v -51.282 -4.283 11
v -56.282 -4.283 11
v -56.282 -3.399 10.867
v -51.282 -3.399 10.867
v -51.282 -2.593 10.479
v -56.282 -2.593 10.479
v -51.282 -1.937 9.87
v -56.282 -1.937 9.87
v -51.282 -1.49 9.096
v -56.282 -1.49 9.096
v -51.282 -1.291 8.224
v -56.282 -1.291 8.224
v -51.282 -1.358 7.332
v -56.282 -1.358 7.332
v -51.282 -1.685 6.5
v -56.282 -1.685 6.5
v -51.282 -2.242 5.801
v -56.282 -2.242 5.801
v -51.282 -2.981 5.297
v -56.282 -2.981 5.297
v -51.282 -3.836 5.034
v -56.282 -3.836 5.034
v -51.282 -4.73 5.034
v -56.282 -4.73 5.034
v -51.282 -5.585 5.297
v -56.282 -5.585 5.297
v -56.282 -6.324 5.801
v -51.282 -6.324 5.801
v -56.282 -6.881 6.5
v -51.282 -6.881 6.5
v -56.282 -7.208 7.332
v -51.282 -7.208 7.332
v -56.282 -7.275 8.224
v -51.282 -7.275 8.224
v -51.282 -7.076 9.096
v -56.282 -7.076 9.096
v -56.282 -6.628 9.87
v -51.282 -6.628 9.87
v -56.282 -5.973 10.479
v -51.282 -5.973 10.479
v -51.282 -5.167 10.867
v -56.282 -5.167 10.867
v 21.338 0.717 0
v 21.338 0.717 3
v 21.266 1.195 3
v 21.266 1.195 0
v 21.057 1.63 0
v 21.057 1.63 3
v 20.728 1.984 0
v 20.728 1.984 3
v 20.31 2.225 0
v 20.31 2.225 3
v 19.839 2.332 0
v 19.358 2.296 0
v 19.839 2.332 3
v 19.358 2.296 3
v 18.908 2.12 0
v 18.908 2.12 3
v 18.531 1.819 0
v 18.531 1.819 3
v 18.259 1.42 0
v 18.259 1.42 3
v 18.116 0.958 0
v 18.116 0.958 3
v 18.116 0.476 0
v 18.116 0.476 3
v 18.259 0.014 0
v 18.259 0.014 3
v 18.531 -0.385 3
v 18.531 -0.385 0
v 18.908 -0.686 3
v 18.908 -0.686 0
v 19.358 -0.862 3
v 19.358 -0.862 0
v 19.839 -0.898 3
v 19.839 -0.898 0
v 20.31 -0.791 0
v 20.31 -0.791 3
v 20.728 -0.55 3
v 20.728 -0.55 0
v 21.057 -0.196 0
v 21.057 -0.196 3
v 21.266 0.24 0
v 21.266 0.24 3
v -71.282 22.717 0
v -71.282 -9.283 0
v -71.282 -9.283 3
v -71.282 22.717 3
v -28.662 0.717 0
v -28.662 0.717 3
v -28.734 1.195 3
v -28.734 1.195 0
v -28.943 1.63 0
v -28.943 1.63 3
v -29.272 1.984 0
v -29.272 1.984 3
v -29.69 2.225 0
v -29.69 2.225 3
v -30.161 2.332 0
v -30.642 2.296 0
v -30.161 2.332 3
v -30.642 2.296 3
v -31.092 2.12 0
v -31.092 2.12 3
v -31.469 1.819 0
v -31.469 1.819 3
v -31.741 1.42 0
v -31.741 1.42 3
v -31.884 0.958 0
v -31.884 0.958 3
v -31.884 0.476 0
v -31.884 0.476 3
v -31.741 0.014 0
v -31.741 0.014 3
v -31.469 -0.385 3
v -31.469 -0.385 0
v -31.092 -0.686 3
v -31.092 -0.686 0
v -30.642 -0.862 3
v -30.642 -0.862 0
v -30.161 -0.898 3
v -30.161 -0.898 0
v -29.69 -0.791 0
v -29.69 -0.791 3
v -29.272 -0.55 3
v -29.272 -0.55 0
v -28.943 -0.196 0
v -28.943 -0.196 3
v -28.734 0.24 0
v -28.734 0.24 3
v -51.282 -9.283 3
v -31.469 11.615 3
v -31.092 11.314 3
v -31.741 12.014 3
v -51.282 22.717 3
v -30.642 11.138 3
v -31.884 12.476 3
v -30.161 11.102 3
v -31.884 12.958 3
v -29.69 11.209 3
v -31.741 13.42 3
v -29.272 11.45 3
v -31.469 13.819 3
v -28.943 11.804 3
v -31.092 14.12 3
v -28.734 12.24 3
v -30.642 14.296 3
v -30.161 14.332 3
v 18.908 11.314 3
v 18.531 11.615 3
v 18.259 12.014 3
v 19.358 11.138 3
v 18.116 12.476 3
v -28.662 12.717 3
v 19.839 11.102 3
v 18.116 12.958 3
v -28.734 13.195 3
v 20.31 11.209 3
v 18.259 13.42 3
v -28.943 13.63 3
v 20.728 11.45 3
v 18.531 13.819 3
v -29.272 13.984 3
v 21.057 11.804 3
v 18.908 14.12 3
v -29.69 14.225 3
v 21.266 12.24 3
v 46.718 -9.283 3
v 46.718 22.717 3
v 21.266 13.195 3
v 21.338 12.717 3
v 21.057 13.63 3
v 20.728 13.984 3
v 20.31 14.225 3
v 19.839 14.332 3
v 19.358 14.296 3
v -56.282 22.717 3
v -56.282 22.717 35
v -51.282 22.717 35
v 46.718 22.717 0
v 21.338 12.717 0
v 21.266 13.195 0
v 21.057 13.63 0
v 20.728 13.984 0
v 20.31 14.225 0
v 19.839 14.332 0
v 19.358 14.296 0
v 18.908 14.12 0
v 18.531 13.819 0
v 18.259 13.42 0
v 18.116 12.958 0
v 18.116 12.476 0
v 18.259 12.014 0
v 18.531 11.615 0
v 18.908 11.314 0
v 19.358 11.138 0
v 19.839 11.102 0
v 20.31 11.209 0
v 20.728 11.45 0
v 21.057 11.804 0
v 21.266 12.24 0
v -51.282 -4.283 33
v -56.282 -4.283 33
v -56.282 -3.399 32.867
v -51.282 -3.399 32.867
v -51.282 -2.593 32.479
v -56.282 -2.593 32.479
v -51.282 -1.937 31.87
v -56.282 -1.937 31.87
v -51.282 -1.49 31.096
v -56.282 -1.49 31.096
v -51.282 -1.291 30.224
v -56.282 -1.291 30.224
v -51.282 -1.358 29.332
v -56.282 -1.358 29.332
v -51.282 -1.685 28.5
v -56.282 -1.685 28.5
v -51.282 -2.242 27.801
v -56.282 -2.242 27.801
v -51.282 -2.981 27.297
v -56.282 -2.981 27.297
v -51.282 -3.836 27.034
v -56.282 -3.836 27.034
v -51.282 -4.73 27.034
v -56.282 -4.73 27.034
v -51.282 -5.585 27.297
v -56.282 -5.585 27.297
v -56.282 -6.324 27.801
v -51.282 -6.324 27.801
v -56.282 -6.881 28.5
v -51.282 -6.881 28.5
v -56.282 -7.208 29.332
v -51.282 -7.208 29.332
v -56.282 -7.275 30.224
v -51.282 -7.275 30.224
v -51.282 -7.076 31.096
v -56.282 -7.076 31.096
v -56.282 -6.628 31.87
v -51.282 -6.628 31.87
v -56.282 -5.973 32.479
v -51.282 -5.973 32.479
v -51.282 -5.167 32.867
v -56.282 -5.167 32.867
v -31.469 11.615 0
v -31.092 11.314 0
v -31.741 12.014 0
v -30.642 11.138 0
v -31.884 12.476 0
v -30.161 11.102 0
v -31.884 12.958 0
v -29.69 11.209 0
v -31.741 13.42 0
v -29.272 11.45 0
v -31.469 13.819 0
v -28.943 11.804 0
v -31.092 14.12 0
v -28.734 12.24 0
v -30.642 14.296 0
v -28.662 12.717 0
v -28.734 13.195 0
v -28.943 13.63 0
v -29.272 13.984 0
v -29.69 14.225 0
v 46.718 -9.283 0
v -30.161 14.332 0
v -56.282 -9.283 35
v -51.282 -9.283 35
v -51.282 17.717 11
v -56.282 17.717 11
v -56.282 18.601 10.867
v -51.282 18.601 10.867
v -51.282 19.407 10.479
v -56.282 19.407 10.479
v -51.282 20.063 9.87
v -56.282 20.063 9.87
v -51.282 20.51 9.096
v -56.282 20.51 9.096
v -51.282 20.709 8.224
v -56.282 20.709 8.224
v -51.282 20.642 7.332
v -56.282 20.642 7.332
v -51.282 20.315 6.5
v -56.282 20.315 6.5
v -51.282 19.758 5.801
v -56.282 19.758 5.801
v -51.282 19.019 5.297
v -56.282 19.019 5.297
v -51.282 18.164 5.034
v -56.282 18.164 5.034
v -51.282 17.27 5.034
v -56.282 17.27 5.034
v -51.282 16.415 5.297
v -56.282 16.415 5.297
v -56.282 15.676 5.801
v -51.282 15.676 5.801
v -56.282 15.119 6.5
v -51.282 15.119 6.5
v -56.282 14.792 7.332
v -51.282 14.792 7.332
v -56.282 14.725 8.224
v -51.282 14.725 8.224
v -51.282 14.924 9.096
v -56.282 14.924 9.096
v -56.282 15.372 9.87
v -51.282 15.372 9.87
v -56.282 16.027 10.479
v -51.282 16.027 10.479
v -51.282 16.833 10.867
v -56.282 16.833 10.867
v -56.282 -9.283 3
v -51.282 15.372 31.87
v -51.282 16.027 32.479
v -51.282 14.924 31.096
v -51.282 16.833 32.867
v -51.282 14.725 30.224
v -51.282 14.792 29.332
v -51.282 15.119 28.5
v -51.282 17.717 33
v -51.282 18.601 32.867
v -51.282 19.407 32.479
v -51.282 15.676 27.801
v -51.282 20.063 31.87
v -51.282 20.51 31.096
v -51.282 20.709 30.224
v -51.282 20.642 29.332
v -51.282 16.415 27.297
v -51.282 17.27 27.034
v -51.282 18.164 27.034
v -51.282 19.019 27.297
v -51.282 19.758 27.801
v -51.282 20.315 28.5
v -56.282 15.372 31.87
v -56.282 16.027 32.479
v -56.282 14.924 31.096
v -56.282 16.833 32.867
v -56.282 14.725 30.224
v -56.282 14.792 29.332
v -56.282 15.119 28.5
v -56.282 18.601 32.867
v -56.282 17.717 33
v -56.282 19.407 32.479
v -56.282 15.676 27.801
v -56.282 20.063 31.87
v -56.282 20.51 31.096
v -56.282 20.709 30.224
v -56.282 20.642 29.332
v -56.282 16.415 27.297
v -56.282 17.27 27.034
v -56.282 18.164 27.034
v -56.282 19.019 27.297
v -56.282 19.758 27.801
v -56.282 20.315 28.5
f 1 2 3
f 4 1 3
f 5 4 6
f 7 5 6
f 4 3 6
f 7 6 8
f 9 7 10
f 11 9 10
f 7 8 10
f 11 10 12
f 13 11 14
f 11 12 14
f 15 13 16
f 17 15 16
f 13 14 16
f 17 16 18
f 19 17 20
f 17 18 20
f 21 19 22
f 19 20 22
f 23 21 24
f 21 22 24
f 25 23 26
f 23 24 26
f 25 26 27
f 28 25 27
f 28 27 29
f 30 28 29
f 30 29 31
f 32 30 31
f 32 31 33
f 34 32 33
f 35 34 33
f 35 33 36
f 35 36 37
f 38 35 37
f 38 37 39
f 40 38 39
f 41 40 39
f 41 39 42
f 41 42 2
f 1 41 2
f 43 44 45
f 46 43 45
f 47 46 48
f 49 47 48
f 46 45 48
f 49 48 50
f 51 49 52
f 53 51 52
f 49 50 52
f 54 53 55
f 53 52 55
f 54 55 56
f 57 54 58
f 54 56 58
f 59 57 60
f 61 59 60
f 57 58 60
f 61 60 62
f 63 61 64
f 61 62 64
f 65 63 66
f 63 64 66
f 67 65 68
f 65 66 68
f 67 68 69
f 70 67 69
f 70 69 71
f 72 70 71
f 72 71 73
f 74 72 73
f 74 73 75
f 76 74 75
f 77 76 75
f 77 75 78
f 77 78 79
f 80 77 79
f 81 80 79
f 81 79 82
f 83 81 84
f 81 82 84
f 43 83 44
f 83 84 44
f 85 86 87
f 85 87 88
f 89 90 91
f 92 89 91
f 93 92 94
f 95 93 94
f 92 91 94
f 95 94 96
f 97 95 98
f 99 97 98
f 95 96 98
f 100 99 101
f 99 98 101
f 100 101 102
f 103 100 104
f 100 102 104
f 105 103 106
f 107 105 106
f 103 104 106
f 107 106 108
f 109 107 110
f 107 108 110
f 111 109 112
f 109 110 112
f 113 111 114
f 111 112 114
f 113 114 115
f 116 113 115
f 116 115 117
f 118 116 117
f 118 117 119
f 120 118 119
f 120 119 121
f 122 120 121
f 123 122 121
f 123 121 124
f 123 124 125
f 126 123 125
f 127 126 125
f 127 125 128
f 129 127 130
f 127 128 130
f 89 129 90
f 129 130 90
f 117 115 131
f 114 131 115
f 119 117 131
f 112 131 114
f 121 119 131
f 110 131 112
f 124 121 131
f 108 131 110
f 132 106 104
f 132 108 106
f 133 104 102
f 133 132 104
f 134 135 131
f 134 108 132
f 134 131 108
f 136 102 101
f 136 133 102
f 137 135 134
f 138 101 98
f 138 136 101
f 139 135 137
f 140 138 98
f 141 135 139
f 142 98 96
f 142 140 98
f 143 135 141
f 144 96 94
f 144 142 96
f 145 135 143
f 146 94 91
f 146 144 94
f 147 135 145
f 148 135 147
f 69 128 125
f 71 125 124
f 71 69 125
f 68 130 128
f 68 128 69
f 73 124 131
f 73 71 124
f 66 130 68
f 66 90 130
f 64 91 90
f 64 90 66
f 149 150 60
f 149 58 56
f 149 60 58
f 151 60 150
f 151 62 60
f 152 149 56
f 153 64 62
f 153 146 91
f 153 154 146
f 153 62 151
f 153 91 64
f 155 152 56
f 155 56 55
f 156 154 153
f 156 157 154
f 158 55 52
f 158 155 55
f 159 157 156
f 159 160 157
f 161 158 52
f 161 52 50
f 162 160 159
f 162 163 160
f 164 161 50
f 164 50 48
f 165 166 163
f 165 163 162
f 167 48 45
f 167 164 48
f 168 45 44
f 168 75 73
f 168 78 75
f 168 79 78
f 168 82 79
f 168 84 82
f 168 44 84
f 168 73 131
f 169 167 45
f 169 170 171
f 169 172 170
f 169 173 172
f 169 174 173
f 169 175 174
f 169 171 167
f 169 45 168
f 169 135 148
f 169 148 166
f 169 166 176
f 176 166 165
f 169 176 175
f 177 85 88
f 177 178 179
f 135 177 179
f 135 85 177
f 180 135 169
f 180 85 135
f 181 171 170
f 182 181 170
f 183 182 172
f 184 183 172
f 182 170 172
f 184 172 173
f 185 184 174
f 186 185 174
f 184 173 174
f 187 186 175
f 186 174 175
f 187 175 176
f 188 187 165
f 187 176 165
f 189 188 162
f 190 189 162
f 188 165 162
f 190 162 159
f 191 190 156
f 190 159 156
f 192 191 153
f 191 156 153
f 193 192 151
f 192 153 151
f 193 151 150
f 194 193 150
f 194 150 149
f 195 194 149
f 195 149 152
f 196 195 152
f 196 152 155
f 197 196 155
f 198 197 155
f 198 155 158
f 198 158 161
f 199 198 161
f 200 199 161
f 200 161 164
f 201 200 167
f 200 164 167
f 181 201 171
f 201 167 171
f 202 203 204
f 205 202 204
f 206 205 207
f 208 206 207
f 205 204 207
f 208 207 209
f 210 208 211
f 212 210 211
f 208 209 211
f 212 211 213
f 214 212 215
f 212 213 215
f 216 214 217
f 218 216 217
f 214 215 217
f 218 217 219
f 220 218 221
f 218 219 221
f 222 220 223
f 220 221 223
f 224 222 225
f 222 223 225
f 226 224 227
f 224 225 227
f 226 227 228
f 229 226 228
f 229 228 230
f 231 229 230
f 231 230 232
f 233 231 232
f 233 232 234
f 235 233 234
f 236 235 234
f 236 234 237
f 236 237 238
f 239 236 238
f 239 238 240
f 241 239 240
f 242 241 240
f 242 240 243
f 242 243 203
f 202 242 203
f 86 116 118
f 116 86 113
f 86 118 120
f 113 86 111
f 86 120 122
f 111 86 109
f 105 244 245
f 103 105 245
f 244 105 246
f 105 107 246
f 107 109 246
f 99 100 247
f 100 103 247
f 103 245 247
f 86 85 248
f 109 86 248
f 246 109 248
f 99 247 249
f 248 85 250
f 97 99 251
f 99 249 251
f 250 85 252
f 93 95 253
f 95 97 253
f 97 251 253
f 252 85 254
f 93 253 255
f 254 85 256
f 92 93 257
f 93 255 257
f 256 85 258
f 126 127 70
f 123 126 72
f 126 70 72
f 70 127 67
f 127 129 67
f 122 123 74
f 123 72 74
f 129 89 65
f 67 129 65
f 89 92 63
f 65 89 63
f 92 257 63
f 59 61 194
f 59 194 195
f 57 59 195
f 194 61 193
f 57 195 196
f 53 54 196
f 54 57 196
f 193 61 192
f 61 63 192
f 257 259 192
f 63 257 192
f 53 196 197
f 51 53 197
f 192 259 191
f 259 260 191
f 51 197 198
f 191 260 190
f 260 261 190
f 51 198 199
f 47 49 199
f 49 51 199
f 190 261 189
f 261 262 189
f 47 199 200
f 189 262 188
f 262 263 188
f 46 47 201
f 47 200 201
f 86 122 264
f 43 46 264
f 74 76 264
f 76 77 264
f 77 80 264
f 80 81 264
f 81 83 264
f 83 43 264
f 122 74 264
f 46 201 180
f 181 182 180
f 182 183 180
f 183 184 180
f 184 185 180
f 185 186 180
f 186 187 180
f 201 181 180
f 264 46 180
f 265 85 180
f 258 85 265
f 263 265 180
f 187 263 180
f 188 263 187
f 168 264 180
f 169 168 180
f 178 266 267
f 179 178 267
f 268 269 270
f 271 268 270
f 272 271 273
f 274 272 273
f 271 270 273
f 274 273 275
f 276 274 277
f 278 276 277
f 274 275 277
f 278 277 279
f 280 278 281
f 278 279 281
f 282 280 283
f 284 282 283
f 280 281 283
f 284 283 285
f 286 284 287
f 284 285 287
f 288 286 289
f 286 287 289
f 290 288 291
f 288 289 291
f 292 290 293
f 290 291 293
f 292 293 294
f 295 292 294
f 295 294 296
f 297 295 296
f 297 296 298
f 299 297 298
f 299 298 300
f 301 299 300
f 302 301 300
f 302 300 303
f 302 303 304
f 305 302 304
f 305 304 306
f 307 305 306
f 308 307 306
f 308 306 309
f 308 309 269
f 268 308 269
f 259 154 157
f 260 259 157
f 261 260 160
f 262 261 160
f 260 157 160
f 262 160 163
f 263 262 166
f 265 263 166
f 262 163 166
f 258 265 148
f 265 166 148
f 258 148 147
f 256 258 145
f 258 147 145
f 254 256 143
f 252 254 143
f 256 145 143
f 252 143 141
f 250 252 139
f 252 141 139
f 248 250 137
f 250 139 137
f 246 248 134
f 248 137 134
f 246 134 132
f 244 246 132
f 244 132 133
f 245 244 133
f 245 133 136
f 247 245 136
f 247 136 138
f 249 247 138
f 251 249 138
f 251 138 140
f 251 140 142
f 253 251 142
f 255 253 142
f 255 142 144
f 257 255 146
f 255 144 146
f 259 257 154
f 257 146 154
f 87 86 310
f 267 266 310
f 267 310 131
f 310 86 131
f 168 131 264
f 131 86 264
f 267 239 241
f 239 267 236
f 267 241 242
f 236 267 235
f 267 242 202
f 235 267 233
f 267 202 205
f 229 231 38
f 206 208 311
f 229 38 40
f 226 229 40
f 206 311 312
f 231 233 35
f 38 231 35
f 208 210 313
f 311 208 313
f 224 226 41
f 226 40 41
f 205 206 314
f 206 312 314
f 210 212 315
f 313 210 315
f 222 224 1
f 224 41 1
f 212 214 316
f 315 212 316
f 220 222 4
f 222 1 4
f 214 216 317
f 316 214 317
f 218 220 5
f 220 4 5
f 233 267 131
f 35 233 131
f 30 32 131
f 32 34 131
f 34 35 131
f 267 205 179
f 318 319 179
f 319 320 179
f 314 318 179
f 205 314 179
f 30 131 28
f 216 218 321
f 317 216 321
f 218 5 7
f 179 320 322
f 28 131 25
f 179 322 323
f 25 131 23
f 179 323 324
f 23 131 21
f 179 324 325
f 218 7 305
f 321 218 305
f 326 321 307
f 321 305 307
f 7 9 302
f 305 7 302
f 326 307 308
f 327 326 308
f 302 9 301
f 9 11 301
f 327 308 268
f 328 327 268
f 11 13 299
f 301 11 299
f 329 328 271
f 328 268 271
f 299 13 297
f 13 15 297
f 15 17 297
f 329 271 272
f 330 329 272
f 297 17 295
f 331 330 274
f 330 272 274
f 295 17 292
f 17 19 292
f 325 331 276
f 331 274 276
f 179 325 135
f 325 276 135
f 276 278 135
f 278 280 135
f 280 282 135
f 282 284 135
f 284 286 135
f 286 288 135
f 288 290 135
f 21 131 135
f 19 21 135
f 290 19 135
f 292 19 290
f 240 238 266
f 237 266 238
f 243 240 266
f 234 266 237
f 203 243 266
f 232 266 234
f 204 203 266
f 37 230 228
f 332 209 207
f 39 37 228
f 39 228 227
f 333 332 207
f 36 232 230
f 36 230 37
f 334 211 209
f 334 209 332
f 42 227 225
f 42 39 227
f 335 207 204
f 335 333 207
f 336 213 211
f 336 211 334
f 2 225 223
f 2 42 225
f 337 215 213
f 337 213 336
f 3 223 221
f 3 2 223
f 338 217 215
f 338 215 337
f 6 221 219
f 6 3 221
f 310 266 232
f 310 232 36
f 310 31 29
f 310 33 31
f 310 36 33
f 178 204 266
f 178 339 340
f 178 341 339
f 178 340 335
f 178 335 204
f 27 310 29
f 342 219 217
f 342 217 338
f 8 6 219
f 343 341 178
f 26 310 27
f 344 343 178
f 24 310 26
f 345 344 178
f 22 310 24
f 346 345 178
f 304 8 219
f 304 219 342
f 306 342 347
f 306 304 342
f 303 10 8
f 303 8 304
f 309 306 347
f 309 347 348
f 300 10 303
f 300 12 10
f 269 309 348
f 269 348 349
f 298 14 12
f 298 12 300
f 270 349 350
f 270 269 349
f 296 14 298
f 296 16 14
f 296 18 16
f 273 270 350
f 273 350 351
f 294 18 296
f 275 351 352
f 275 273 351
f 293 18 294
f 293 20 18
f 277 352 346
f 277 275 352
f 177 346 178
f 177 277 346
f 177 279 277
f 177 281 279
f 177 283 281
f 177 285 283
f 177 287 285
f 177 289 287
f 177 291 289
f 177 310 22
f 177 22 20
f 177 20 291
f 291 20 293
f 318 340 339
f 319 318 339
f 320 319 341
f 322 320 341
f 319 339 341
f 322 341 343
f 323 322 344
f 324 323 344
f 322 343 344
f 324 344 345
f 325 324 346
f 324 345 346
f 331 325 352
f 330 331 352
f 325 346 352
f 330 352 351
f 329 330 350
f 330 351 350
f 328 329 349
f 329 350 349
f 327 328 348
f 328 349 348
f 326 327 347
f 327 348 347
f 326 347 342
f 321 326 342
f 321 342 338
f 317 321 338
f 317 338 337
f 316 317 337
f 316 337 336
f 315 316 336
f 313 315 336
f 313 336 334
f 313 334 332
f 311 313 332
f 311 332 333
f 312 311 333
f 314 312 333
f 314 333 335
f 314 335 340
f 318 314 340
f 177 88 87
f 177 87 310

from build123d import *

# Parameters (mm, degrees)
SKETCH_1_W          = 118
SKETCH_1_H          = 32
EXTRUDE_1_DEPTH     = 3
SKETCH_2_R          = 1.62
CUT_EXTRUDE_1_DEPTH = 3
SKETCH_3_W          = 5
SKETCH_3_H          = 32
EXTRUDE_2_DEPTH     = 32
SKETCH_4_R          = 3
CUT_EXTRUDE_2_DEPTH = 32


with BuildPart() as part:
    # 草图1 → 凸台-拉伸1 (new body)
    with BuildSketch(Plane.XY):
        with Locations((-12.281632653, 6.717006803)):
            Rectangle(SKETCH_1_W, SKETCH_1_H)
    extrude(amount=EXTRUDE_1_DEPTH)

    # 草图2 → 切除-拉伸1 (cut)
    with BuildSketch(Plane.XY.offset(3)):
        with Locations((-30.281632653, 12.717006803)):
            Circle(SKETCH_2_R)
        with Locations((-30.281632653, 0.717006803)):
            Circle(SKETCH_2_R)
        with Locations((19.718367347, 12.717006803)):
            Circle(SKETCH_2_R)
        with Locations((19.718367347, 0.717006803)):
            Circle(SKETCH_2_R)
    extrude(amount=-CUT_EXTRUDE_1_DEPTH, mode=Mode.SUBTRACT)

    # 草图3 → 凸台-拉伸2 (add)
    with BuildSketch(Plane.XY.offset(3)):
        with Locations((-53.781632653, 6.717006803)):
            Rectangle(SKETCH_3_W, SKETCH_3_H)
    extrude(amount=EXTRUDE_2_DEPTH)

    # 草图4 → 切除-拉伸2 (cut)
    with BuildSketch(Plane.ZY.offset(71.281632653)):
        with Locations((30, 17.717006803)):
            Circle(SKETCH_4_R)
        with Locations((30, -4.282993197)):
            Circle(SKETCH_4_R)
        with Locations((8, 17.717006803)):
            Circle(SKETCH_4_R)
        with Locations((8, -4.282993197)):
            Circle(SKETCH_4_R)
    extrude(amount=-CUT_EXTRUDE_2_DEPTH, mode=Mode.SUBTRACT)


solid = part.part
